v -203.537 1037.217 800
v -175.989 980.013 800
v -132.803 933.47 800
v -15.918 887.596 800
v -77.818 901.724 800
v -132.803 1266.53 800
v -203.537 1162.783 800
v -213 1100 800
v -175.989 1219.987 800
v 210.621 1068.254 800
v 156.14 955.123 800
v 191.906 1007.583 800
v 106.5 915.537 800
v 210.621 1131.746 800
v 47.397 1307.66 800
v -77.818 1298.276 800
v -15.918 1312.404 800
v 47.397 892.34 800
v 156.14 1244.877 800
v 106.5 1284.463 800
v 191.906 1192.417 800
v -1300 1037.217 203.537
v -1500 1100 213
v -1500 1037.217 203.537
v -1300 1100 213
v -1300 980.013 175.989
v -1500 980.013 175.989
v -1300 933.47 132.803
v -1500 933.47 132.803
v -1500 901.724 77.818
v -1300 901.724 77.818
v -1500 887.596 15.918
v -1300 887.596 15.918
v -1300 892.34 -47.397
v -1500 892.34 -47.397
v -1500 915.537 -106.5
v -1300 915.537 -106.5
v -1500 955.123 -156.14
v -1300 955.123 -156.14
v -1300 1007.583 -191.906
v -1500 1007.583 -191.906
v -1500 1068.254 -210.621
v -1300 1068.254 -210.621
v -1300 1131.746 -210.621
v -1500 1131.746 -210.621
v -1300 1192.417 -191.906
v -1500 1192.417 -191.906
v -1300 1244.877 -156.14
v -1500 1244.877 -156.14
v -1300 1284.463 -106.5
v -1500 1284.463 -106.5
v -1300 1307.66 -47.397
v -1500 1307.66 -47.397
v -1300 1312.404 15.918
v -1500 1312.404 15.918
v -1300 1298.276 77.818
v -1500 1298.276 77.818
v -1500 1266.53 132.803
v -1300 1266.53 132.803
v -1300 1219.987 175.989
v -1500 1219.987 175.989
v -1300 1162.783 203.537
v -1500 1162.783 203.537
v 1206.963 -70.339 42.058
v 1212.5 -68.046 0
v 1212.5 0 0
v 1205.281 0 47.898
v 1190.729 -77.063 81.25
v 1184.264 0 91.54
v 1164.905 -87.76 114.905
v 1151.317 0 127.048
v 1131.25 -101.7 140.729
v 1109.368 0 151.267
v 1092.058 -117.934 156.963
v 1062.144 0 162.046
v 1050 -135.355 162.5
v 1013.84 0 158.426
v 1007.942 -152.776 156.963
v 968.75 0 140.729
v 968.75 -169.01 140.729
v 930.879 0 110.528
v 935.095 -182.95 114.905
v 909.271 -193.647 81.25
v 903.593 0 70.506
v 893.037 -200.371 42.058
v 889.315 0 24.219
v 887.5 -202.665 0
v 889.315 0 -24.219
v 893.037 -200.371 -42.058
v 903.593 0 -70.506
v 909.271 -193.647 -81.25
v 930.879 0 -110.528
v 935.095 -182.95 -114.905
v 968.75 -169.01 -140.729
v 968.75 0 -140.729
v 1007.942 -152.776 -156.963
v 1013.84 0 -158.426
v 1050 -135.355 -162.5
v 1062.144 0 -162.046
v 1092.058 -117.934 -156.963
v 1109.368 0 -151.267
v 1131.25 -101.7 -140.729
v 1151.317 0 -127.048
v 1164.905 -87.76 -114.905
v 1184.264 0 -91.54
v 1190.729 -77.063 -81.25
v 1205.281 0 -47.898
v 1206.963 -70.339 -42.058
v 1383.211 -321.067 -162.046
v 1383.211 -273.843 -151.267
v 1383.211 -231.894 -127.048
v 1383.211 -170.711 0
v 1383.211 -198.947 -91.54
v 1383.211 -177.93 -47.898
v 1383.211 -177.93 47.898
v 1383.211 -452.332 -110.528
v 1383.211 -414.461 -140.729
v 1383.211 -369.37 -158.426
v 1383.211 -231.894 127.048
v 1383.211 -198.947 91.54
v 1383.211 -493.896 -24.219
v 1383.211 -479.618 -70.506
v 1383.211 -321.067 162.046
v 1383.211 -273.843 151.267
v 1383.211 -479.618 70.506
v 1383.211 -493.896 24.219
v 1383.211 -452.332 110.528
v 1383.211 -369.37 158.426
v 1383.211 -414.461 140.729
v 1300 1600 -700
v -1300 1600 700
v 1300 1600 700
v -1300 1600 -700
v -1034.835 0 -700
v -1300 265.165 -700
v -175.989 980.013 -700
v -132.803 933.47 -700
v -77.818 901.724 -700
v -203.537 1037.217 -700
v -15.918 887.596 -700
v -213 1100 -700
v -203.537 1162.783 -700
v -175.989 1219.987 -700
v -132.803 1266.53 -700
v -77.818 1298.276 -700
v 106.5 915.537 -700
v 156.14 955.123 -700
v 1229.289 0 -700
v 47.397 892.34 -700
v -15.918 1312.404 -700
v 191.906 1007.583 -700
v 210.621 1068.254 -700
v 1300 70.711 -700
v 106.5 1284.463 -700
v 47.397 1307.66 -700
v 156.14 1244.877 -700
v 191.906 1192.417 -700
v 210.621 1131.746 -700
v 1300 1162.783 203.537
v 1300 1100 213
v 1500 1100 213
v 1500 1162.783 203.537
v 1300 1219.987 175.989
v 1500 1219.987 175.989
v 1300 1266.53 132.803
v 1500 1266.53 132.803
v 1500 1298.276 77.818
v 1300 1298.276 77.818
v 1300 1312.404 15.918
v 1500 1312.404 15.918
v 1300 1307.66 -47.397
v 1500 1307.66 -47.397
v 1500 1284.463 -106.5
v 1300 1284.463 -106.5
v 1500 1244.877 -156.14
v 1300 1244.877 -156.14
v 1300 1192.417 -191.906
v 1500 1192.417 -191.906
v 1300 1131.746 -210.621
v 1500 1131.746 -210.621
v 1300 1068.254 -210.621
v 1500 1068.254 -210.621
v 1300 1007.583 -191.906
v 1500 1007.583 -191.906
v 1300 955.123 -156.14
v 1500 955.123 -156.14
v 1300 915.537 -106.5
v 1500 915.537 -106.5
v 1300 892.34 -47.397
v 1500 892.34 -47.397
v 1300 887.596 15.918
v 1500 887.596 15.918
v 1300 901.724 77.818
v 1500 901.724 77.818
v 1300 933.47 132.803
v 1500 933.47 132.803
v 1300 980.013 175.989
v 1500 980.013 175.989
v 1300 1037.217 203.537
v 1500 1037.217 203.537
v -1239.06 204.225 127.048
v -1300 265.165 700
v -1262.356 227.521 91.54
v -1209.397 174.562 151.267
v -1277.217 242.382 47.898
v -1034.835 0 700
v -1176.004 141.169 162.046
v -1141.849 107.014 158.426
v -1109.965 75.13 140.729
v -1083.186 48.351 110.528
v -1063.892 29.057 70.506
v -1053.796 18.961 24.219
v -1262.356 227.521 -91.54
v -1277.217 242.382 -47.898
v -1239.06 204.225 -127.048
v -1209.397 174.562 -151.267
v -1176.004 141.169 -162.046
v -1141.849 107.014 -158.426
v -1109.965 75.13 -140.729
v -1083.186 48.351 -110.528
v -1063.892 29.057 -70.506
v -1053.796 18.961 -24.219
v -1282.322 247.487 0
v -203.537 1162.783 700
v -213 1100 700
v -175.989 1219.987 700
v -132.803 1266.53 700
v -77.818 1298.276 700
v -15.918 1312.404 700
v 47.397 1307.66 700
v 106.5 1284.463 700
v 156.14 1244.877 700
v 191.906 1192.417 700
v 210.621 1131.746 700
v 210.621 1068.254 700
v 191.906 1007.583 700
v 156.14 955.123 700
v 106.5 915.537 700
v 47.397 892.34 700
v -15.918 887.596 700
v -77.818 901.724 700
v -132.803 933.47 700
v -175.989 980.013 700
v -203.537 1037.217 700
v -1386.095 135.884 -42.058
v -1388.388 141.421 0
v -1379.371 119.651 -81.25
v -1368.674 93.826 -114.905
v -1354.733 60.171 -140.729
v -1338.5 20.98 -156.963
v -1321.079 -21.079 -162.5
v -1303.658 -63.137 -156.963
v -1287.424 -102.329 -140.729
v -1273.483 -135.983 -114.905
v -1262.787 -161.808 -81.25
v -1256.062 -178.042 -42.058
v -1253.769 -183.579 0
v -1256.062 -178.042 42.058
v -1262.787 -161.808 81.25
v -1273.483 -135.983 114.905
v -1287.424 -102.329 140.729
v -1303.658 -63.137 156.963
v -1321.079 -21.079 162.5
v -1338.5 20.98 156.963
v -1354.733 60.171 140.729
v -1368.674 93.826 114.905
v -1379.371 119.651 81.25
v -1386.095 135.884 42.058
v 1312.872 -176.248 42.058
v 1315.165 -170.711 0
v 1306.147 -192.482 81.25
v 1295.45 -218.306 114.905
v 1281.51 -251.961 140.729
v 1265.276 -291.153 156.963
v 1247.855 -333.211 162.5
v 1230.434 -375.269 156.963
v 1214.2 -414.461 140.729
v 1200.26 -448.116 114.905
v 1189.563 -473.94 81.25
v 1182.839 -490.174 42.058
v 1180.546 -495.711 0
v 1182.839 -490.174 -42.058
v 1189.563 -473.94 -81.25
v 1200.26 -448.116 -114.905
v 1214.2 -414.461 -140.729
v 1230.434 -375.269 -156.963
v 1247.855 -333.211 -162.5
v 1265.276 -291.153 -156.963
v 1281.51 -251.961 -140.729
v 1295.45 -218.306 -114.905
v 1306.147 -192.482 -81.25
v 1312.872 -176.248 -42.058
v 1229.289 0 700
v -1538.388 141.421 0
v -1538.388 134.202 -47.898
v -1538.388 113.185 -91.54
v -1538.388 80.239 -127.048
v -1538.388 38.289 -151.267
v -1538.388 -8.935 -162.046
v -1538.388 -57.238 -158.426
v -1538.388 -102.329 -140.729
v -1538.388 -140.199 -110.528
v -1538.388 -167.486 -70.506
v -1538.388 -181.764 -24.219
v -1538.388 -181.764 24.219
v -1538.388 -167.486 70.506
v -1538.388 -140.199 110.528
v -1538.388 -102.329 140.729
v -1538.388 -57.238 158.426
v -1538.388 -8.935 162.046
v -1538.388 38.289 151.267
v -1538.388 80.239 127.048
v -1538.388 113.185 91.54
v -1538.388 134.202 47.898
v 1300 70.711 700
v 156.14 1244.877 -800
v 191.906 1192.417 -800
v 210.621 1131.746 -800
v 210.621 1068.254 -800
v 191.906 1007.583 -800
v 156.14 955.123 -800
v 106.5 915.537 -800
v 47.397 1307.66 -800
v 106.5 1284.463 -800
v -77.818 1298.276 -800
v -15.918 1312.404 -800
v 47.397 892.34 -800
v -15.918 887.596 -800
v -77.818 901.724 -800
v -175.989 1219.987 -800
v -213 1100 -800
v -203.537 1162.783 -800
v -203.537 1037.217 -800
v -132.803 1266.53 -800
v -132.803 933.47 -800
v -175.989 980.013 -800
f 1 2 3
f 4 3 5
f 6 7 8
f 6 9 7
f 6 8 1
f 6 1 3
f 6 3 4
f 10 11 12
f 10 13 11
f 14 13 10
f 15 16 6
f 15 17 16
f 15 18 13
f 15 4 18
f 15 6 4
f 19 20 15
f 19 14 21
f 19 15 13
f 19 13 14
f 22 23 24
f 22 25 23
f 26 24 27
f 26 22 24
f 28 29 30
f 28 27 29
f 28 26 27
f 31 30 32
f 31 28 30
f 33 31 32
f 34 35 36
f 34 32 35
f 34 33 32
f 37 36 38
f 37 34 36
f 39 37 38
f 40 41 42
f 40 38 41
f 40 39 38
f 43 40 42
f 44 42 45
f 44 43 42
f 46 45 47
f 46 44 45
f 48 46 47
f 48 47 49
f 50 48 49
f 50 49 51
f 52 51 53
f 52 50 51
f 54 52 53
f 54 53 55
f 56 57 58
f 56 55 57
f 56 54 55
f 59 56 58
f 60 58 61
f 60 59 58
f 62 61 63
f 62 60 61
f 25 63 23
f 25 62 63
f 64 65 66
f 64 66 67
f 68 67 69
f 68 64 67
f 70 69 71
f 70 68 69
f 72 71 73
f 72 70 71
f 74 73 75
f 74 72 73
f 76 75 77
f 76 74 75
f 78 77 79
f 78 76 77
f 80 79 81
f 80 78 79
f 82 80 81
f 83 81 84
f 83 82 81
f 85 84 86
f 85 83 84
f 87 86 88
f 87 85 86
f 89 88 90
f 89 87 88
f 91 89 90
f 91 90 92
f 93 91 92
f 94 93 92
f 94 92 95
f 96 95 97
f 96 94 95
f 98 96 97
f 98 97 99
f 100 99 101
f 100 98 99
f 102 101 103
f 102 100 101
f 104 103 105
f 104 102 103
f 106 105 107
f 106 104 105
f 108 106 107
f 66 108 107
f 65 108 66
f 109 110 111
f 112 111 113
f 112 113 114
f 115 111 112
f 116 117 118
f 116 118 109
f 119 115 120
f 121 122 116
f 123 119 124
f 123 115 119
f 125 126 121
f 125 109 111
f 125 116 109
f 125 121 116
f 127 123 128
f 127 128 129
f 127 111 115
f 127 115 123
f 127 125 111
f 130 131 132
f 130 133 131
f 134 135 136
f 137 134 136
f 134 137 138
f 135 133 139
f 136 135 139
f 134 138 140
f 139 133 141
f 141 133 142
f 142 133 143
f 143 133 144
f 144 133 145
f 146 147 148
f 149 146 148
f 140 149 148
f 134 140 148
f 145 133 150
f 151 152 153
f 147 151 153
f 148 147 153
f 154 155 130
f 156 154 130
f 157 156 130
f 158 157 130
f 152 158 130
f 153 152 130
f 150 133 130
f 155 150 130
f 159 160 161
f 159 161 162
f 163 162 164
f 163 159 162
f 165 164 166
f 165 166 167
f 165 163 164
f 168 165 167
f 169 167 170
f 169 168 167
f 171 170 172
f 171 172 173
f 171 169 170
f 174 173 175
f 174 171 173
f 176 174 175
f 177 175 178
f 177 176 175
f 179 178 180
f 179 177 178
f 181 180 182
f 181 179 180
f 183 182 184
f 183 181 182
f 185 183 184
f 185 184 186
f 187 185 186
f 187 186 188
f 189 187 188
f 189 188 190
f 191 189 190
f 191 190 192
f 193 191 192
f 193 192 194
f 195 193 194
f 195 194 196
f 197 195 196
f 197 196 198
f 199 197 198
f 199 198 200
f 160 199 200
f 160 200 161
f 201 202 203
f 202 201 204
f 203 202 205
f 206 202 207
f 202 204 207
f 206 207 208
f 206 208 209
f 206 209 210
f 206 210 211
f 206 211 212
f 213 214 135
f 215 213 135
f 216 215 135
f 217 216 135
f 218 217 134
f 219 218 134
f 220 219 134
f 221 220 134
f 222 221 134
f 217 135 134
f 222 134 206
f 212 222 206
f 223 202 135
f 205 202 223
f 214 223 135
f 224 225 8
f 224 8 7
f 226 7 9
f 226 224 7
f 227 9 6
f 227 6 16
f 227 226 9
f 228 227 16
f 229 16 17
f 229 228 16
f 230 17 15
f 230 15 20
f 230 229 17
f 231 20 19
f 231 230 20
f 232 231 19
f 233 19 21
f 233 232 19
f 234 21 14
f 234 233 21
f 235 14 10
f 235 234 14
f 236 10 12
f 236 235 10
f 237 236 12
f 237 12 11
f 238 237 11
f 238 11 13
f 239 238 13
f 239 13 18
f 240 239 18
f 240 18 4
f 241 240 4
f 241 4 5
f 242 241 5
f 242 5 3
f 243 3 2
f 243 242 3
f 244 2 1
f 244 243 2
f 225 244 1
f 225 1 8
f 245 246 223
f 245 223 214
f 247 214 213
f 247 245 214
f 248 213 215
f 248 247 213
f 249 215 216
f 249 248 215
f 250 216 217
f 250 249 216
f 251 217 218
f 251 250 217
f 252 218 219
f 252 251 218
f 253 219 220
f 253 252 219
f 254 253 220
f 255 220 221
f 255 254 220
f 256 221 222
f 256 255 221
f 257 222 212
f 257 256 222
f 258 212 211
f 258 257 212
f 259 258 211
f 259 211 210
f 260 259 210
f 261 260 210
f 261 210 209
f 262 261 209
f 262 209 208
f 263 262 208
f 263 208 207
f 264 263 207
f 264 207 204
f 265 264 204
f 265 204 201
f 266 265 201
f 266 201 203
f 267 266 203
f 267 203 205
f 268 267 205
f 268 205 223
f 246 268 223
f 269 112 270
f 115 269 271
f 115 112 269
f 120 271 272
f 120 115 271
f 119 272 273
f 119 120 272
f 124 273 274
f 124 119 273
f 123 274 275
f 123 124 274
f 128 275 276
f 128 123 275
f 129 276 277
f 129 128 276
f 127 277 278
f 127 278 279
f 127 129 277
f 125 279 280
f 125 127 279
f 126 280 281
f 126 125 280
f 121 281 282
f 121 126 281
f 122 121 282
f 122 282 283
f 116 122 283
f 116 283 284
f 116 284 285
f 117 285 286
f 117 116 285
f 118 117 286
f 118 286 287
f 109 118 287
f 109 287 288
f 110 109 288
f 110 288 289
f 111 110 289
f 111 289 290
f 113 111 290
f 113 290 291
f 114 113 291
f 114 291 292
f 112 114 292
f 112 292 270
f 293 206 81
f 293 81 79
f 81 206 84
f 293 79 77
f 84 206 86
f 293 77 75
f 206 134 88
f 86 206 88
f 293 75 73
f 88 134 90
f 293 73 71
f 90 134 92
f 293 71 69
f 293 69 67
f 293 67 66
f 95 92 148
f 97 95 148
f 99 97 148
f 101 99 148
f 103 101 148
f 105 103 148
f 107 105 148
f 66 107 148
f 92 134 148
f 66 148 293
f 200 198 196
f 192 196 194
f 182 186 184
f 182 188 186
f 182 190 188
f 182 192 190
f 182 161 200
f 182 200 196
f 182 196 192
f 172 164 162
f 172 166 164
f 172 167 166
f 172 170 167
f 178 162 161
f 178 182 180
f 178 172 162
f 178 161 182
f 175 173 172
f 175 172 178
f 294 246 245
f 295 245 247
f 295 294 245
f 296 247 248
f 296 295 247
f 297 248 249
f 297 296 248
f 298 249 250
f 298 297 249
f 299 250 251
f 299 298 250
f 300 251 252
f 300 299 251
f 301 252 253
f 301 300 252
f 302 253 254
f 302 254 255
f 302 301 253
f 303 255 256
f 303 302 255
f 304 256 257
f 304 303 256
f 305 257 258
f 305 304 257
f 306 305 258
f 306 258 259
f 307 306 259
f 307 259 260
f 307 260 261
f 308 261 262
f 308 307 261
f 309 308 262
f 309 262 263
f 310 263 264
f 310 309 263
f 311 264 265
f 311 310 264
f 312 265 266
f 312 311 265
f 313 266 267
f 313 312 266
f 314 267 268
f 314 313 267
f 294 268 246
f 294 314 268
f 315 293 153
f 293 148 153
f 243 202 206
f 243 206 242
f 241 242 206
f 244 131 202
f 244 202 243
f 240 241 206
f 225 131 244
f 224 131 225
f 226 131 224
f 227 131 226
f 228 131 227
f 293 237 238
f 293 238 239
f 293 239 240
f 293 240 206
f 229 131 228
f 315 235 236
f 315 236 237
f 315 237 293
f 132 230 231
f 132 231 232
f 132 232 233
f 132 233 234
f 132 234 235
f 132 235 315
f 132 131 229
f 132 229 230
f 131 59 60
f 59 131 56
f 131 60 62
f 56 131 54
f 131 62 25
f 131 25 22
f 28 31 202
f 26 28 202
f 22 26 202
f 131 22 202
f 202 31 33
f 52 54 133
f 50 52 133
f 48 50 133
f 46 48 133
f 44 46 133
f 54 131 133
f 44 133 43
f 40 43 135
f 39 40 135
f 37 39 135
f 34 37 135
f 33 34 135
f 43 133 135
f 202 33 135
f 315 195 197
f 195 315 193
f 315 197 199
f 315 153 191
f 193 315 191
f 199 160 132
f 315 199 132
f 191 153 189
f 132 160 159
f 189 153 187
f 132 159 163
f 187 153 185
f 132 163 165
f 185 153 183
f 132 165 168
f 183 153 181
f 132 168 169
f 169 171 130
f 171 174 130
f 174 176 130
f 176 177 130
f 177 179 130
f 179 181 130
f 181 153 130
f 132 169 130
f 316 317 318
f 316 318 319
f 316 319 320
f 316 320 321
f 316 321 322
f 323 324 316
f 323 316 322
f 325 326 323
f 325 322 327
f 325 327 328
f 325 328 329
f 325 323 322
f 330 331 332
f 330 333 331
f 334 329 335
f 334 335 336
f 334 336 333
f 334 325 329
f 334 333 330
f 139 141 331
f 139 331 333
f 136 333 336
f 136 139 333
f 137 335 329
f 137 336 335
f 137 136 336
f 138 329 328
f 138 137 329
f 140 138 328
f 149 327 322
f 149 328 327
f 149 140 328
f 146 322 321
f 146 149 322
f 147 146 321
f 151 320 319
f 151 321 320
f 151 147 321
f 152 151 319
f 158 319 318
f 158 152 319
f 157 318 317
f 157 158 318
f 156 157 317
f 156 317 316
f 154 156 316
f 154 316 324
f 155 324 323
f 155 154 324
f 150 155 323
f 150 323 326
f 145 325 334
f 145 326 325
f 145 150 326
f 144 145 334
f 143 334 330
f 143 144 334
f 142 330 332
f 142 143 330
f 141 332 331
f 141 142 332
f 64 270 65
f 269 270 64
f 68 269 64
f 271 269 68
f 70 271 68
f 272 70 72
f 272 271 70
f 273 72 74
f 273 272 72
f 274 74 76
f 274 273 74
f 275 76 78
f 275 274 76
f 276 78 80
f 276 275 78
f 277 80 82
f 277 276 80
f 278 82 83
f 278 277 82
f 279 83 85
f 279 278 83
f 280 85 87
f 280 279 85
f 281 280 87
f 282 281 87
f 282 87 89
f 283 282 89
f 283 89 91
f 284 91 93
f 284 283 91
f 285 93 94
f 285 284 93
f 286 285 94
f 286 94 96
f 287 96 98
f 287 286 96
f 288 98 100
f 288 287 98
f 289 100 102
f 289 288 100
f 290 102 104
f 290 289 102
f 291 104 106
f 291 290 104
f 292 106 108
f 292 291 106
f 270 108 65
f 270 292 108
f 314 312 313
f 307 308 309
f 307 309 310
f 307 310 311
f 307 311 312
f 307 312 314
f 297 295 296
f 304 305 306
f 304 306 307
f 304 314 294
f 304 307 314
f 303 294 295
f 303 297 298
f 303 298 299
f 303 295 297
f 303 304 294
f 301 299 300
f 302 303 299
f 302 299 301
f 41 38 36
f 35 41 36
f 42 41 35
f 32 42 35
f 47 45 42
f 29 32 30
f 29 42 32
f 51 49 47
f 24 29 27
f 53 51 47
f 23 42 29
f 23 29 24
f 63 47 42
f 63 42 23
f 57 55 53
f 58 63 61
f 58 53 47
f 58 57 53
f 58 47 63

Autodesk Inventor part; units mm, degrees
ref_plane "YZ Plane" through (0, 0, 0) normal (1, 0, 0) x (0, 1, 0)
ref_plane "XZ Plane" through (0, 0, 0) normal (0, 1, 0) x (-1, 0, 0)
ref_plane "XY Plane" through (0, 0, 0) normal (0, 0, 1) x (1, 0, 0)
sketch "Sketch18" plane through (0, 0, 0) normal (0, 0, 1) x (1, 0, 0)
  circle A0 centre (0, 1100) radius 213
  line L0 (0, 0) -> (0, 1100) construction
  line L1 (0, 1100) -> (0, 1600) construction
  line L2 (0, 1100) -> (-158.3548, 850) construction
  line L3 (-158.3548, 850) -> (-454.2876, 850) construction
  line L4 (-454.2876, 850) -> (-612.6424, 1100) construction
  line L5 (-612.6424, 1100) -> (0, 1100) construction
  line L6 (-1300, 1600) -> (1300, 1600)
  line L7 (1541.1151, -621.787) -> (-1872.5331, -621.787) construction
  line L8 (-1300, 1600) -> (-1300, 265.165)
  line L9 (-1300, 265.165) -> (-1034.835, 0)
  line L10 (-1034.835, 0) -> (1229.2893, 0)
  line L11 (1229.2893, 0) -> (1300, 70.7107)
  line L12 (1300, 70.7107) -> (1300, 1600)
  line L13 (-1538.3883, 141.4214) -> (-1538.3883, -183.5786)
  line L14 (-1538.3883, 198.9214) -> (-1566.3883, 198.9214)
  line L15 (-1566.3883, 198.9214) -> (-1566.3883, -241.0786)
  line L16 (-1566.3883, -241.0786) -> (-1538.3883, -241.0786)
  line L17 (-1538.3883, -241.0786) -> (-1538.3883, 198.9214)
  line L18 (-1167.4175, 132.5825) -> (-1321.0786, -21.0786) construction
  line L19 (-1321.0786, -21.0786) -> (-1538.3883, -21.0786) construction
  line L20 (-1538.3883, 141.4214) -> (-1388.3883, 141.4214)
  line L21 (-1388.3883, 141.4214) -> (-1282.3223, 247.4874)
  line L22 (-1538.3883, -183.5786) -> (-1253.7689, -183.5786)
  line L23 (-1253.7689, -183.5786) -> (-1052.5126, 17.6777)
  line L24 (-1388.3883, 141.4214) -> (-1253.7689, -183.5786)
  line L25 (1383.2107, -113.2107) -> (1411.2107, -113.2107)
  line L26 (1411.2107, -113.2107) -> (1411.2107, -553.2107)
  line L27 (1411.2107, -553.2107) -> (1383.2107, -553.2107)
  line L28 (1383.2107, -553.2107) -> (1383.2107, -113.2107)
  line L29 (1050, 0) -> (1050, -135.3553) construction
  line L30 (1050, -135.3553) -> (1247.8553, -333.2107) construction
  line L31 (1247.8553, -333.2107) -> (1383.2107, -333.2107) construction
  line L32 (1383.2107, -170.7107) -> (1283.2107, -170.7107)
  line L33 (1283.2107, -170.7107) -> (1212.5, -100)
  line L34 (1212.5, -100) -> (1212.5, 0)
  line L35 (1383.2107, -495.7107) -> (1212.5, -495.7107)
  line L36 (1212.5, -495.7107) -> (887.5, -170.7107)
  line L37 (887.5, -170.7107) -> (887.5, 0)
  line L38 (1212.5, -100) -> (887.5, -170.7107)
  line L39 (1283.2107, -170.7107) -> (1212.5, -495.7107)
  line L40 (1247.8553, -135.3553) -> (1050, -333.2107) construction
  line L41 (1212.5, -50) -> (887.5, -50) construction
  line L42 (-764.544, 0) -> (-593.6658, 0)
  line L43 (28, 0) -> (23.8247, 0)
  line L44 (28, -50) -> (28, 0)
  line L45 (28, -50) -> (-28, -50)
  line L46 (-28, -50) -> (-28, -22)
  line L47 (-28, -22) -> (0, -22)
  line L48 (0, -22) -> (0, 0)
  line L49 (0, -22) -> (28, -22) construction
  line L50 (-33.8617, -50) -> (33.8617, -50)
  line L51 (33.8617, -50) -> (33.8617, -60)
  line L52 (33.8617, -60) -> (-33.8617, -60)
  line L53 (-33.8617, -60) -> (-33.8617, -50)
  line L54 (-37.5, -60) -> (37.5, -60)
  line L55 (37.5, -60) -> (37.5, -200)
  line L56 (37.5, -200) -> (-37.5, -200)
  line L57 (-37.5, -200) -> (-37.5, -60)
  line L58 (378, 0) -> (373.8247, 0)
  line L59 (350, -22) -> (350, 0)
  line L60 (322, -22) -> (350, -22)
  line L61 (350, -22) -> (378, -22) construction
  line L62 (322, -50) -> (322, -22)
  line L63 (378, -50) -> (378, 0)
  line L64 (378, -50) -> (322, -50)
  line L65 (387.5, -60) -> (387.5, -200)
  line L66 (383.8617, -50) -> (383.8617, -60)
  line L67 (312.5, -200) -> (312.5, -60)
  line L68 (387.5, -200) -> (312.5, -200)
  line L69 (316.1383, -50) -> (383.8617, -50)
  line L70 (383.8617, -60) -> (316.1383, -60)
  line L71 (312.5, -60) -> (387.5, -60)
  line L72 (316.1383, -60) -> (316.1383, -50)
  line L73 (-322, 0) -> (-326.1753, 0)
  line L74 (-350, -22) -> (-350, 0)
  line L75 (-378, -22) -> (-350, -22)
  line L76 (-350, -22) -> (-322, -22) construction
  line L77 (-378, -50) -> (-378, -22)
  line L78 (-322, -50) -> (-322, 0)
  line L79 (-322, -50) -> (-378, -50)
  line L80 (-312.5, -60) -> (-312.5, -200)
  line L81 (-316.1383, -50) -> (-316.1383, -60)
  line L82 (-387.5, -200) -> (-387.5, -60)
  line L83 (-312.5, -200) -> (-387.5, -200)
  line L84 (-383.8617, -50) -> (-316.1383, -50)
  line L85 (-316.1383, -60) -> (-383.8617, -60)
  line L86 (-387.5, -60) -> (-312.5, -60)
  line L87 (-383.8617, -60) -> (-383.8617, -50)
  line L88 (728, 0) -> (723.8247, 0)
  line L89 (700, -22) -> (700, 0)
  line L90 (672, -22) -> (700, -22)
  line L91 (700, -22) -> (728, -22) construction
  line L92 (672, -50) -> (672, -22)
  line L93 (728, -50) -> (728, 0)
  line L94 (728, -50) -> (672, -50)
  line L95 (737.5, -60) -> (737.5, -200)
  line L96 (733.8617, -50) -> (733.8617, -60)
  line L97 (662.5, -200) -> (662.5, -60)
  line L98 (737.5, -200) -> (662.5, -200)
  line L99 (666.1383, -50) -> (733.8617, -50)
  line L100 (733.8617, -60) -> (666.1383, -60)
  line L101 (662.5, -60) -> (737.5, -60)
  line L102 (666.1383, -60) -> (666.1383, -50)
  line L103 (-672, 0) -> (-676.1753, 0)
  line L104 (-700, -22) -> (-700, 0)
  line L105 (-728, -22) -> (-700, -22)
  line L106 (-700, -22) -> (-672, -22) construction
  line L107 (-728, -50) -> (-728, -22)
  line L108 (-672, -50) -> (-672, 0)
  line L109 (-672, -50) -> (-728, -50)
  line L110 (-662.5, -60) -> (-662.5, -200)
  line L111 (-666.1383, -50) -> (-666.1383, -60)
  line L112 (-737.5, -200) -> (-737.5, -60)
  line L113 (-662.5, -200) -> (-737.5, -200)
  line L114 (-733.8617, -50) -> (-666.1383, -50)
  line L115 (-666.1383, -60) -> (-733.8617, -60)
  line L116 (-737.5, -60) -> (-662.5, -60)
  line L117 (-733.8617, -60) -> (-733.8617, -50)
  point P0 (-306.3212, 850)
  point P1 (-306.3212, 1100)
  point P2 (0, -50)
  point P3 (0, -60)
  point P4 (350, 0)
  point P5 (350, -50)
  point P6 (350, -60)
  point P7 (-350, 0)
  point P8 (-350, -50)
  point P9 (-350, -60)
  point P10 (700, 0)
  point P11 (700, -50)
  point P12 (700, -60)
  point P13 (-700, 0)
  point P14 (-700, -50)
  point P15 (-700, -60)
  dimension "d112" = 426
  dimension "d113" = 1100
  dimension "d114" = 500
  dimension "d115" = 1100
  dimension "d116" = 250
  dimension "d120" = 2600
  dimension "d121" = 325
  dimension "d123" = 28
  dimension "d124" = 440
  dimension "d125" = 135
  dimension "d127" = 67.5
  dimension "d128" = 100
  dimension "d129" = 375
  dimension "d130" = 1600
  dimension "d131" = 150
  dimension "d132" = 250
  dimension "d133" = 100
  dimension "d135" = 50
  dimension "d136" = -28
  dimension "d137" = 10
  dimension "d138" = 140
  dimension "d139" = 75
  dimension "d142" = 350
  dimension "d157" = 217.3097
  dimension "d164" = 135.3553
  dimension "d165" = 279.8097
extrude "Extrusion16" add sketch "Sketch18" along normal mid plane 1400 contours A0 | L6 L12 L11 L10 L9 L8
sketch "Sketch19" plane through (-1300, 265.165, 700) normal (-1, 0, 0) x (0, 0, 1)
  circle A0 centre (-700, 834.835) radius 213
  line L0 (0, 0) -> (-1400, 0) construction
  line L1 (0, 1334.835) -> (0, 0) construction
  line L2 (-1400, 1334.835) -> (0, 1334.835) construction
  line L3 (-1400, 0) -> (-1400, 1334.835) construction
  line L4 (-1400, 1334.835) -> (0, 1334.835) projected
  point P0 (-700, -265.165)
  point P1 (-700, 1334.835)
  point P2 (-700, 1334.835)
  dimension "d149" = 500
  dimension "d150" = 426
extrude "Extrusion17" add sketch "Sketch19" along normal blind 200
sketch "Sketch20" plane through (0, 0, -700) normal (0, 0, -1) x (-1, 0, 0)
  circle A0 centre (0, 1100) radius 213
  line L0 (1300, 1600) -> (-1300, 1600) projected
  point P0 (0, 0)
  point P1 (0, 1600)
  point P2 (0, 1600)
  dimension "d153" = 500
  dimension "d154" = 426
extrude "Extrusion18" add sketch "Sketch20" along normal blind 100
sketch "Sketch23" plane through (0, 0, 0) normal (0, 0, 1) x (1, 0, 0)
  line L0 (-1300, 265.165) -> (-1034.835, 0) construction
  line L1 (-1034.835, 0) -> (1229.2893, 0) construction
  line L2 (1229.2893, 0) -> (1300, 70.7107) construction
  line L3 (1300, 70.7107) -> (1300, 1600) construction
  line L4 (1300, 1600) -> (-1300, 1600) construction
  line L5 (-1300, 1600) -> (-1300, 265.165) construction
  line L6 (1050, 0) -> (1050, -135.3553)
  line L7 (1050, -135.3553) -> (1247.8553, -333.2107)
  line L8 (1247.8553, -333.2107) -> (1383.2107, -333.2107)
  point P0 (0, 0)
  dimension "d162" = 135
  dimension "d163" = 250
  dimension "d166" = 135.3553
  dimension "d167" = 279.8097
sketch "Sketch21" plane through (0, 0, 0) normal (0, 0, 1) x (1, 0, 0)
  line L0 (-1300, 265.165) -> (-1034.835, 0) construction
  line L1 (-1034.835, 0) -> (1229.2893, 0) construction
  line L2 (1229.2893, 0) -> (1300, 70.7107) construction
  line L3 (1300, 70.7107) -> (1300, 1600) construction
  line L4 (1300, 1600) -> (-1300, 1600) construction
  line L5 (-1300, 1600) -> (-1300, 265.165) construction
  line L6 (-1167.4175, 132.5825) -> (-1321.0786, -21.0786)
  line L7 (-1321.0786, -21.0786) -> (-1538.3883, -21.0786)
  point P0 (0, 0)
  dimension "d158" = 217.3097
sketch "Sketch22" plane through (-1034.835, 0, 700) normal (-0.7071, -0.7071, 0) x (-0.7071, 0.7071, 0)
  circle A0 centre (187.5, 700) radius 162.5
  point P0 (-731.7388, 700)
  dimension "d159" = 325
sweep "Sweep3" add profiles "Sketch22" path "Sketch21"
sketch "Sketch24" plane through (-1034.835, 0, 700) normal (0, -1, 0) x (1, 0, 0)
  circle A0 centre (2084.835, -700) radius 162.5
  point P0 (1034.835, -700)
  dimension "d168" = 325
sweep "Sweep4" add profiles "Sketch24" path "Sketch23"
mirror "Mirror7" about plane through (0, 0, 0) normal (1, 0, 0) of "Extrusion17"
mirror "Mirror8" about plane through (0, 0, 0) normal (0, 0, 1) of "Extrusion18"
properties part number "GBK-RK-0004 RK dummy 4" material "Stainless Steel"
